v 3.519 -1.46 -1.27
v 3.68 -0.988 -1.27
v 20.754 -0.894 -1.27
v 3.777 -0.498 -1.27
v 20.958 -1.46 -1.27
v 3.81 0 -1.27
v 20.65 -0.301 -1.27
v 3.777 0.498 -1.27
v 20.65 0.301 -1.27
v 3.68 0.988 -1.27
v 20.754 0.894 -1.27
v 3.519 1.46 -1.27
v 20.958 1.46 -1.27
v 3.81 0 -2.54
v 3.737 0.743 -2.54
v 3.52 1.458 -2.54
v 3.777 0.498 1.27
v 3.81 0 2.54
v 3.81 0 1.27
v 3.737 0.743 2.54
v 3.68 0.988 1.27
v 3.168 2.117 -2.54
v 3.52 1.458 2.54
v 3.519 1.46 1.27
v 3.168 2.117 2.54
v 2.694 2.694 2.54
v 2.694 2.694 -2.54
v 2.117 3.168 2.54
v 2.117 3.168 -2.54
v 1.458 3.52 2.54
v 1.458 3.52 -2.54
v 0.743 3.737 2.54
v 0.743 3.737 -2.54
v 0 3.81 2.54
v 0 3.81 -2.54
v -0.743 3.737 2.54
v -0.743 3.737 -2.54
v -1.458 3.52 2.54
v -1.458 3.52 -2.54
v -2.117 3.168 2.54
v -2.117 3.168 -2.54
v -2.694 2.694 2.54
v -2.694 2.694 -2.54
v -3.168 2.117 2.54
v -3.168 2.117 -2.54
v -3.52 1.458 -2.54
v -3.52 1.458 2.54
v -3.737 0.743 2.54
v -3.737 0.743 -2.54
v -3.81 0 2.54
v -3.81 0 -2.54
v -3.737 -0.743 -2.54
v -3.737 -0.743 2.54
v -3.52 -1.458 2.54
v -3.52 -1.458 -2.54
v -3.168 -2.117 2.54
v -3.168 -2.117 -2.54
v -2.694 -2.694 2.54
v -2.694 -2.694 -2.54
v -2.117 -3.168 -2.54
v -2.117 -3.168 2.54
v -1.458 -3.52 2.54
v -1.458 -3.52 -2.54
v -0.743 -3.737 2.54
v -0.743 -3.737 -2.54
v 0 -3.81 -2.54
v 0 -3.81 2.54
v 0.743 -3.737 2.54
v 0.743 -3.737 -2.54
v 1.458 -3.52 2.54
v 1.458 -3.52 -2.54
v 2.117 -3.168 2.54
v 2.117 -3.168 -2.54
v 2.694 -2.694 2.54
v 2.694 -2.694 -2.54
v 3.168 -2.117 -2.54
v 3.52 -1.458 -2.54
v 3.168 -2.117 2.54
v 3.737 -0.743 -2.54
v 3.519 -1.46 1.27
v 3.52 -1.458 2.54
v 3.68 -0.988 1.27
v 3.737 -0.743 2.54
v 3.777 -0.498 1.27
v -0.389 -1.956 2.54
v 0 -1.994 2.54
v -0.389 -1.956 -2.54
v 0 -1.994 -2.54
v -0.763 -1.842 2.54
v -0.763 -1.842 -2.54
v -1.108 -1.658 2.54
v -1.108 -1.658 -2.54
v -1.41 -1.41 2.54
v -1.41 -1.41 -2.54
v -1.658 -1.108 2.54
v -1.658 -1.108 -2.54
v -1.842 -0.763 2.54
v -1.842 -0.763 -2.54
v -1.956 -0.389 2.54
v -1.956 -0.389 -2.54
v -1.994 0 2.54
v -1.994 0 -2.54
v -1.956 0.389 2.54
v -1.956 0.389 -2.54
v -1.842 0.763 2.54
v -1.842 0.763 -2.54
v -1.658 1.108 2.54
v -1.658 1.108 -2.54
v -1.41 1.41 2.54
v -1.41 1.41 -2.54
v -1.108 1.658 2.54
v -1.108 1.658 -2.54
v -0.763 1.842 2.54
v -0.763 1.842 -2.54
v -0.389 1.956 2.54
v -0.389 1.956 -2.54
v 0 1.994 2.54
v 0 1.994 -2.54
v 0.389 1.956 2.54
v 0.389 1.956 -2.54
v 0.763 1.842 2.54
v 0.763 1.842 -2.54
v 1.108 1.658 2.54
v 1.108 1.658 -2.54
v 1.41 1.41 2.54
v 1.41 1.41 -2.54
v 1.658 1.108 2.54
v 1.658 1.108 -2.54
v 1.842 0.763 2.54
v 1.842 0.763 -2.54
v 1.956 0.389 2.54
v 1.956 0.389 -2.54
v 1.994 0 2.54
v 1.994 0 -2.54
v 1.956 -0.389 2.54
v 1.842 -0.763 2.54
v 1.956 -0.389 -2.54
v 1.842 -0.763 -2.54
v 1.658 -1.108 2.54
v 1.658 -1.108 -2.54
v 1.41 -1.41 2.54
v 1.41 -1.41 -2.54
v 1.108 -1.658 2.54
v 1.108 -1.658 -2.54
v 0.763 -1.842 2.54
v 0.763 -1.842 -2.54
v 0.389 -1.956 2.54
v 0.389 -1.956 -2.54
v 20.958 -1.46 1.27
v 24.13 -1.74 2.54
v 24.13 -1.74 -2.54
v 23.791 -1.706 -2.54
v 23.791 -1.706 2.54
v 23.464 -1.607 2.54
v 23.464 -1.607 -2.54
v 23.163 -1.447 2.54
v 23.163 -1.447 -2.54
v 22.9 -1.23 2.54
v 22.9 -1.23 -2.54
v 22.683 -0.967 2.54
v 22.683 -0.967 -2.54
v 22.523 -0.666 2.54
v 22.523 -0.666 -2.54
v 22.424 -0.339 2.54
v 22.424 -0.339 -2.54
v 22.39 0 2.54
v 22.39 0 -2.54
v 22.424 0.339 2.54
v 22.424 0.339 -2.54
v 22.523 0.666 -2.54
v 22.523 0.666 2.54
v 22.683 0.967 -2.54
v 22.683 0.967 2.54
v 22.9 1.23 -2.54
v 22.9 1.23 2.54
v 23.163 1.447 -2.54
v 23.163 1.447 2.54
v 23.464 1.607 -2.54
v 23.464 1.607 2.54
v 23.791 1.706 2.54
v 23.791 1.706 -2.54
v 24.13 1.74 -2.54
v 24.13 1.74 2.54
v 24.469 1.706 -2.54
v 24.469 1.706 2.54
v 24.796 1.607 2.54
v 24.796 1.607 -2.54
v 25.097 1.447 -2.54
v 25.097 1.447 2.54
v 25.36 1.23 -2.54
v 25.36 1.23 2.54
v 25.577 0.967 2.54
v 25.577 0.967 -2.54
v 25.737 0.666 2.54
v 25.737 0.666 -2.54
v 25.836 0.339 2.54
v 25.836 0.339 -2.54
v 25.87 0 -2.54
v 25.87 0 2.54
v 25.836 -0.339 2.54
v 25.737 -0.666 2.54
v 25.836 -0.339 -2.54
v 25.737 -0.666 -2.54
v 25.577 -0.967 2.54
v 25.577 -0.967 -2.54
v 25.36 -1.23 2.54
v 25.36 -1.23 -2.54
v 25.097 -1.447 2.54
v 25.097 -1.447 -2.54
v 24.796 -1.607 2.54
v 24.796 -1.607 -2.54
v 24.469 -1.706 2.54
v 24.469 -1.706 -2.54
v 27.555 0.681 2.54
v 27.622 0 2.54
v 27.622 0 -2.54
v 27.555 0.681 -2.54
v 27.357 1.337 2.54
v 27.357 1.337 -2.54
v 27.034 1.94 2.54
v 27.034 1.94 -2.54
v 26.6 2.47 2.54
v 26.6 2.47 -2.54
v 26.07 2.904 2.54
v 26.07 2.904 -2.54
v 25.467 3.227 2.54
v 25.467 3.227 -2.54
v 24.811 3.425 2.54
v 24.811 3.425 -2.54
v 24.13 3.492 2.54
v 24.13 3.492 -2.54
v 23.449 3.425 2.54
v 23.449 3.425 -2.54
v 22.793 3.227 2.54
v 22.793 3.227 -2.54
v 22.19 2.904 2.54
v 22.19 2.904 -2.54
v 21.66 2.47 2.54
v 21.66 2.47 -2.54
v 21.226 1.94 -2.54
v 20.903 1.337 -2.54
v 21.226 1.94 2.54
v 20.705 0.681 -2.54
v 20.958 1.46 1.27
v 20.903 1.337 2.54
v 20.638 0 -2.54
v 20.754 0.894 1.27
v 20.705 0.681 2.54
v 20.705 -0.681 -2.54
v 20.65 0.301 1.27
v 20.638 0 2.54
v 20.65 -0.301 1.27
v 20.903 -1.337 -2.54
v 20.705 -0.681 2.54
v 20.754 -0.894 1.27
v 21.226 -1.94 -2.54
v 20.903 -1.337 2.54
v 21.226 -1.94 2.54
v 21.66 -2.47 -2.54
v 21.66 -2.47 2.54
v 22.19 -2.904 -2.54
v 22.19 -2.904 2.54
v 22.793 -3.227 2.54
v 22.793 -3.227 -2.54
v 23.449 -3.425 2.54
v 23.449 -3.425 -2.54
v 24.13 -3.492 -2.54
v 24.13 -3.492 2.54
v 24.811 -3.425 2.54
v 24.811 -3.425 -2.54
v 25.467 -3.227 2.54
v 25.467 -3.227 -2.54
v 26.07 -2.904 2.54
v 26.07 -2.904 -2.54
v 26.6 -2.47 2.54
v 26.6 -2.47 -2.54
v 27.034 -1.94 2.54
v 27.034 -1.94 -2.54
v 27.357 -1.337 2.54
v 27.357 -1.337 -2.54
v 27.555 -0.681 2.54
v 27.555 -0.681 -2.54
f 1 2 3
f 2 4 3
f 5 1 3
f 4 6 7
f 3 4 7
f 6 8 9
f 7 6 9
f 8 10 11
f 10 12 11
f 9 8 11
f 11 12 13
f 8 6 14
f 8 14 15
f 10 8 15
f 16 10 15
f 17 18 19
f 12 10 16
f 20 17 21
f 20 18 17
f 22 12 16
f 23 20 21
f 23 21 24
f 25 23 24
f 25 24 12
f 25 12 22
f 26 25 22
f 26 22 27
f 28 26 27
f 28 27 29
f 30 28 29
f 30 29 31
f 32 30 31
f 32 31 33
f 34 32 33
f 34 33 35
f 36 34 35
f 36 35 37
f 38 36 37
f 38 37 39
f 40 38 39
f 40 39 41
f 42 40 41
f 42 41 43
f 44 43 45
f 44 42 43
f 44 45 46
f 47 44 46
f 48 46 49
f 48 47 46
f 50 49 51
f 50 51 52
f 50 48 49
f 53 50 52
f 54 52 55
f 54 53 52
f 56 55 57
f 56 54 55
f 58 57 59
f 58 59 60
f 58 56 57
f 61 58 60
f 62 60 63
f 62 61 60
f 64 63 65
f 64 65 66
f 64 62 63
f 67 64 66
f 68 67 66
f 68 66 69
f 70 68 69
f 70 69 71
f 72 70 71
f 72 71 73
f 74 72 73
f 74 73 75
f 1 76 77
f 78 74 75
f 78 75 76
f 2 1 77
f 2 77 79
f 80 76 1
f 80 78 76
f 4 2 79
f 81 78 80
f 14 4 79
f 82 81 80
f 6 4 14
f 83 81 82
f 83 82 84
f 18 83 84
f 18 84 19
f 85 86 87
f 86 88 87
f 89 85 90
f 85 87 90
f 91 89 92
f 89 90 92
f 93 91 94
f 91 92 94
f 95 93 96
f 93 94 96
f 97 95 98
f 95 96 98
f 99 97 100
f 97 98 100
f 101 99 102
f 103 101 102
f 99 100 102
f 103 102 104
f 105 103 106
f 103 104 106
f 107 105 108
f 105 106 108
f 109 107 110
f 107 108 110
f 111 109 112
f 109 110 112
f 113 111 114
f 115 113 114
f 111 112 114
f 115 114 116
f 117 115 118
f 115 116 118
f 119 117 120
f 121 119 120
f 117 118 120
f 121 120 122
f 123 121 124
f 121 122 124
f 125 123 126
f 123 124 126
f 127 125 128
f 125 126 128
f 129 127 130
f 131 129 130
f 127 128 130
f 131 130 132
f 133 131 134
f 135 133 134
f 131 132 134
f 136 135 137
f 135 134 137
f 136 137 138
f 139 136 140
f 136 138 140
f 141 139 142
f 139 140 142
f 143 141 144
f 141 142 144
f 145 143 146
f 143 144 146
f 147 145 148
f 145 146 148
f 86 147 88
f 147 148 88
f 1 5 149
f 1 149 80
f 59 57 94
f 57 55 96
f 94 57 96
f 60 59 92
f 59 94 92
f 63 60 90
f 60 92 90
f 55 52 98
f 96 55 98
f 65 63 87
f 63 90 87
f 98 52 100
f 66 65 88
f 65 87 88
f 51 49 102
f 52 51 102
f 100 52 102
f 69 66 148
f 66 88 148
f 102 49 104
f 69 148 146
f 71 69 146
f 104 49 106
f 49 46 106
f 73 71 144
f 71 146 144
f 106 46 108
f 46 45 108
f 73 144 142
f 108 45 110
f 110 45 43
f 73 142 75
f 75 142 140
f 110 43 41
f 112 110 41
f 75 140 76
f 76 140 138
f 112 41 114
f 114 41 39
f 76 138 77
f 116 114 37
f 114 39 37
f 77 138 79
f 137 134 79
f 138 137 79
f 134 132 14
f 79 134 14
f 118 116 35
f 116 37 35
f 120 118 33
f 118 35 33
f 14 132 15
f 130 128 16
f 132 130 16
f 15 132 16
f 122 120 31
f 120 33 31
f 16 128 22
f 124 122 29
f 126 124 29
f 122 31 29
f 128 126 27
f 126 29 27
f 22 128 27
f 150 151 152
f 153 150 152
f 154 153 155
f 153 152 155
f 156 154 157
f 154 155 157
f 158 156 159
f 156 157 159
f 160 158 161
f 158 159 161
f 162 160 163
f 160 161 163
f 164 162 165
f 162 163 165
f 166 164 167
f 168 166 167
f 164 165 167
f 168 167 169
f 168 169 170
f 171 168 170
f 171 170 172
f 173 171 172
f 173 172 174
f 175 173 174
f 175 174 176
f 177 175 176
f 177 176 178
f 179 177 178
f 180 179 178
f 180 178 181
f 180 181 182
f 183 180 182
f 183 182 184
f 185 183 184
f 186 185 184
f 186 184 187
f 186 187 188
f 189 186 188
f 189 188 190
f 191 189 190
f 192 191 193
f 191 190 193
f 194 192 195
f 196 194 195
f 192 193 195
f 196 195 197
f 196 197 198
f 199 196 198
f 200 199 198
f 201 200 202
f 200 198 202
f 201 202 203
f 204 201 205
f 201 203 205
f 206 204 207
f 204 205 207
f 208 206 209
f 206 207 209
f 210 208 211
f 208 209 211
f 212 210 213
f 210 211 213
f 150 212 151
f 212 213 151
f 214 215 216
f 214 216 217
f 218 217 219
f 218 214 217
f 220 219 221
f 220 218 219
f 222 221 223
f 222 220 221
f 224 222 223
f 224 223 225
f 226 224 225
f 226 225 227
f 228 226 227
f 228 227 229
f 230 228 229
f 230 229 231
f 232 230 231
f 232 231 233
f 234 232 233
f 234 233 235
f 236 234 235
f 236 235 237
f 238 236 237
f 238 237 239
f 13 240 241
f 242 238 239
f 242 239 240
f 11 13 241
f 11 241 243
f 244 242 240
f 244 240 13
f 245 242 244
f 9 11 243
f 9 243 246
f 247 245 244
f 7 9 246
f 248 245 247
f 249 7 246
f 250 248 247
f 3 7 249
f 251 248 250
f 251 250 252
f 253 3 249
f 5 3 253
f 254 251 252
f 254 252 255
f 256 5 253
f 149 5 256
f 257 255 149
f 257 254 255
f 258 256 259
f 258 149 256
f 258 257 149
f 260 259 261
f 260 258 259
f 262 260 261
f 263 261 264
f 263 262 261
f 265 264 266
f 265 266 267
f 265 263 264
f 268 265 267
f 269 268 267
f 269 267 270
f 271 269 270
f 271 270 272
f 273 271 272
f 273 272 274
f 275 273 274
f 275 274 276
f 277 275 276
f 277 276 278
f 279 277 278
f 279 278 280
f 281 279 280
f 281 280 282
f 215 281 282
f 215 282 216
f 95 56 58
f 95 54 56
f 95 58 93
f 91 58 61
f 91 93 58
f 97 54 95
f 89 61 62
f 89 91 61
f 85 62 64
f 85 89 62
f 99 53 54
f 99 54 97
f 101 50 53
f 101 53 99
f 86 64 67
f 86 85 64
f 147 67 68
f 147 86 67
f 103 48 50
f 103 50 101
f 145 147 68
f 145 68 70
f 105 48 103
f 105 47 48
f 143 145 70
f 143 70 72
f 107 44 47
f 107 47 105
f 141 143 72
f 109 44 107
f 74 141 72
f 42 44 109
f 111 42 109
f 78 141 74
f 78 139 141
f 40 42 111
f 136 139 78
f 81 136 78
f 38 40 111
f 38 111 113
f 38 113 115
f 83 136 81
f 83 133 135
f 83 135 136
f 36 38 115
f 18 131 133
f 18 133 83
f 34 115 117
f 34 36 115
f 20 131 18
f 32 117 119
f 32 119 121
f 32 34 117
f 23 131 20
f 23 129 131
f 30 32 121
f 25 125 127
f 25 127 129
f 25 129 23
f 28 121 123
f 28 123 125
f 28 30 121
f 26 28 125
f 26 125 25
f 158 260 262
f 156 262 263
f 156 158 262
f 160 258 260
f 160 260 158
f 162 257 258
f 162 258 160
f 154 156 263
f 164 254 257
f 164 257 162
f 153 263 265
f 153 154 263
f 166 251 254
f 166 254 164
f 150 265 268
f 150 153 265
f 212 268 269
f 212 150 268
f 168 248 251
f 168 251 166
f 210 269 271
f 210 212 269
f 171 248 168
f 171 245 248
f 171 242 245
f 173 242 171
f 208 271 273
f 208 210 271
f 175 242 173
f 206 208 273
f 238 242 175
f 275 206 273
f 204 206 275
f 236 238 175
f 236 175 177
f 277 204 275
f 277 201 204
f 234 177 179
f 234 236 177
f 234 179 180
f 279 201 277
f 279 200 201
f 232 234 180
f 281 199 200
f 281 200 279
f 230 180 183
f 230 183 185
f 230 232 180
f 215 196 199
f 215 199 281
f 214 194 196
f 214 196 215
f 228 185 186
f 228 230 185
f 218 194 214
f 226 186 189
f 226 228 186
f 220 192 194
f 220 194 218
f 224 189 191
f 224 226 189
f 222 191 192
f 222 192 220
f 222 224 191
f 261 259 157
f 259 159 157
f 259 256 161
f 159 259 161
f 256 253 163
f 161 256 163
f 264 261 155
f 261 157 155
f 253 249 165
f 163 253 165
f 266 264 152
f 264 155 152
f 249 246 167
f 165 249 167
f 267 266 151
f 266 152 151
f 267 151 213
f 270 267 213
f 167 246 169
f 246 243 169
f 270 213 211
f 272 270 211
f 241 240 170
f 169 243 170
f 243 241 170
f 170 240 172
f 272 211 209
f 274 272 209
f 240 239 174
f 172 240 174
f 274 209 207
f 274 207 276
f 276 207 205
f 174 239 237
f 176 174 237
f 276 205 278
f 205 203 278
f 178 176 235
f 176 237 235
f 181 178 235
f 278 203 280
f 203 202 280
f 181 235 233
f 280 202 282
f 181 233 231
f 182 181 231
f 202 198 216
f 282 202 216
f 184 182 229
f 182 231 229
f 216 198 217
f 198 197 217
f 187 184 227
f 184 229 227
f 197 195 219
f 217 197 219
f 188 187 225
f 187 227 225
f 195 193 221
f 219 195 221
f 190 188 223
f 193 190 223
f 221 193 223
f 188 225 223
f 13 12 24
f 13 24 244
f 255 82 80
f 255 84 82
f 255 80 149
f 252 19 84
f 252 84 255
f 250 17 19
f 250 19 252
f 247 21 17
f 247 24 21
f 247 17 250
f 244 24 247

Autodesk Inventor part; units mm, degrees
ref_plane "YZ Plane" through (0, 0, 0) normal (1, 0, 0) x (0, 1, 0)
ref_plane "XZ Plane" through (0, 0, 0) normal (0, 1, 0) x (-1, 0, 0)
ref_plane "XY Plane" through (0, 0, 0) normal (0, 0, 1) x (1, 0, 0)
sketch "Sketch1" plane through (0, 0, 0) normal (0, 0, 1) x (1, 0, 0)
  circle A0 centre (0, 0) radius 3.81
  circle A1 centre (24.13, 0) radius 3.4925
  line L0 (0, 1.4605) -> (24.13, 1.4605)
  line L1 (24.13, 1.4605) -> (24.13, -1.4605)
  line L2 (24.13, -1.4605) -> (0, -1.4605)
  line L3 (0, -1.4605) -> (0, 1.4605)
  dimension "d0" = 7.62
  dimension "d1" = 2.921
  dimension "d2" = 1.4605
  dimension "d3" = 24.13
  dimension "d15" = 6.985
extrude "Extrusion1" add sketch "Sketch1" along normal mid plane 5.08 contours A0 L2 L3 L0 | L0 L3 L2 A0 | L0 L1 L2 A1 | A1 L2 L1 L0
extrude "Extrusion2" add sketch "Sketch1" along normal mid plane 2.54 contours A0 L2 L3 L0 | A0 L0 A1 L2 | L0 L1 L2 A1 picked at (1.27, 0) picked at (22.9658, 0)
hole "Hole2" at (0, 0, 2.54) direction (0, 0, -1) diameter 3.9878 end through all
hole "Hole3" at (24.13, 0, 2.54) direction (0, 0, -1) diameter 3.4798 end through all
equation "\"d2\" = 0.5 * d1"
properties part number "Crank Arm"
